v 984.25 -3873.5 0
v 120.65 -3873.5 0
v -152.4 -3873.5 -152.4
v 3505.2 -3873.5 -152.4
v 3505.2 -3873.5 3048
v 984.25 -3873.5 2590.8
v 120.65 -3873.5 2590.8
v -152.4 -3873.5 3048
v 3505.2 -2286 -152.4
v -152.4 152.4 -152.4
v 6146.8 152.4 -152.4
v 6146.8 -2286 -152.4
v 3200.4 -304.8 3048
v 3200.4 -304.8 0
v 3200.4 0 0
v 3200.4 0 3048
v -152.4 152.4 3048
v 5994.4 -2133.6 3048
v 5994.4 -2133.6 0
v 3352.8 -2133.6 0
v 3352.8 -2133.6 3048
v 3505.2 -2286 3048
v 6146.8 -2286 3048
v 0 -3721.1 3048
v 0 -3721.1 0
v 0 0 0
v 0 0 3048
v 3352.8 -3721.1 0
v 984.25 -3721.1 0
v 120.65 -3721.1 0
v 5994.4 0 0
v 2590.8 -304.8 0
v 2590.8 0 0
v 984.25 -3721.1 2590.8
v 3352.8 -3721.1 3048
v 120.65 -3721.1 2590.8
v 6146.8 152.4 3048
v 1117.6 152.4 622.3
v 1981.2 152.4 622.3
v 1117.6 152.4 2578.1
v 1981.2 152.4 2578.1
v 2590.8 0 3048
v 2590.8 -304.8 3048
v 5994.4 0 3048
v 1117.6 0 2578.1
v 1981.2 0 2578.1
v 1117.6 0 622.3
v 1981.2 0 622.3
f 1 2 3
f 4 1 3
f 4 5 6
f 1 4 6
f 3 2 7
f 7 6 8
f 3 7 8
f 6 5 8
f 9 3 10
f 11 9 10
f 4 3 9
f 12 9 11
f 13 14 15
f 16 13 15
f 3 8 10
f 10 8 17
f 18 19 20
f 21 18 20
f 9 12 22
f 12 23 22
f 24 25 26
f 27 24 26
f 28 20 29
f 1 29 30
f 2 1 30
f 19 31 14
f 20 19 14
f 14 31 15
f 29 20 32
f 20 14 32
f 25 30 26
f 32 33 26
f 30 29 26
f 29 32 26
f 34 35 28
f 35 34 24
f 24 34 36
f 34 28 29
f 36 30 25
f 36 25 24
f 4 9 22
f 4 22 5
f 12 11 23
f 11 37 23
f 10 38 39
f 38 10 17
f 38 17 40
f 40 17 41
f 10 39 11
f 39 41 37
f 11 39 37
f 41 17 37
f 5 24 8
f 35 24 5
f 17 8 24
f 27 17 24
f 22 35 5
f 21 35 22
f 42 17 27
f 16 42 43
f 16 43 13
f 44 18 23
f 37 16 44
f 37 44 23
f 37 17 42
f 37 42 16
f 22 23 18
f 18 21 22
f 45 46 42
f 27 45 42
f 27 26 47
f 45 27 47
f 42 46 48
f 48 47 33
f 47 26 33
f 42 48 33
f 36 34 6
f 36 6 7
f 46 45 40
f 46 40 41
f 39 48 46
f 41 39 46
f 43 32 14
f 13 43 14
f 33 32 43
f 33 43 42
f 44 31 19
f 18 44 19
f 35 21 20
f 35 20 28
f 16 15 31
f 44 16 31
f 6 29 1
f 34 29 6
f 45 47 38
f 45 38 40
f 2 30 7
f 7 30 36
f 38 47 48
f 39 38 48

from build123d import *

# Parameters (mm, degrees)
F1_DEPTH = 3048
F3_DEPTH = 152.4
F4_W     = 863.6
F4_H     = 2590.8
F5_DEPTH = 152.401
F6_W     = 863.6
F6_H     = 1955.8
F7_DEPTH = 152.401
F8_W     = 609.6
F8_H     = 304.8
F9_DEPTH = 3048


with BuildPart() as f1:
    # F0 (on Top) → F1 (new body)
    with BuildSketch(Plane.XY):
        Polygon((6146.8, -2286), (6146.8, 152.4), (-152.4, 152.4), (-152.4, -3873.5), (3505.2, -3873.5), (3505.2, -2286), align=None)
        Polygon((0, -3721.1), (0, 0), (5994.4, 0), (5994.4, -2133.6), (3352.8, -2133.6), (3352.8, -3721.1), align=None, mode=Mode.SUBTRACT)
    extrude(amount=F1_DEPTH)

    # F2 (on face) → F3 (join)
    with BuildSketch(Plane(origin=(0, 0, 0), x_dir=(1, 0, 0), z_dir=(0, 0, -1))):
        Polygon((-152.4, 3873.5), (-152.4, -152.4), (6146.8, -152.4), (6146.8, 2286), (3505.2, 2286), (3505.2, 3873.5), align=None)
    extrude(amount=F3_DEPTH)

    # F4 (on face) → F5 (cut, through all)
    with BuildSketch(Plane(origin=(0, -3721.1, 0), x_dir=(-1, 0, 0), z_dir=(0, 1, 0))):
        with Locations((-552.45, 1295.4)):
            Rectangle(F4_W, F4_H)
    extrude(amount=-F5_DEPTH, mode=Mode.SUBTRACT)

    # F6 (on face) → F7 (cut, through all)
    with BuildSketch(Plane.XZ):
        with Locations((1549.4, 1600.2)):
            Rectangle(F6_W, F6_H)
    extrude(amount=-F7_DEPTH, mode=Mode.SUBTRACT)

    # F8 (on face) → F9 (join, through all)
    with BuildSketch(Plane.XY):
        with Locations((2895.6, -152.4)):
            Rectangle(F8_W, F8_H)
    extrude(amount=F9_DEPTH)


solid = f1.part
